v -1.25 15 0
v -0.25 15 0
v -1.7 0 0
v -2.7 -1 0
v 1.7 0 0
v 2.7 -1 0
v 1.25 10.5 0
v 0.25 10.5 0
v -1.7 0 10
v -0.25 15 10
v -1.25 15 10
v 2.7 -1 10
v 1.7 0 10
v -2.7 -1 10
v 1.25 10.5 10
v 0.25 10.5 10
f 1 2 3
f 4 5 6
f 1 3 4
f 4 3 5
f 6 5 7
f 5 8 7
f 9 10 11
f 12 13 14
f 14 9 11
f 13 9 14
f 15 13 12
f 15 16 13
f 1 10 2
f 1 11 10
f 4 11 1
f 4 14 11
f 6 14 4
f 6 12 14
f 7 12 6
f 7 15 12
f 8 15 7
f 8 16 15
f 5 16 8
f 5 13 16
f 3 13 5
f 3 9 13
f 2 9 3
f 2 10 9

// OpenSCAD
// [FL_INDEX: keywords="openscad, 3d_parametric, Customizable_Tumbler_Tag, csg_solid" | COT="Parametric OpenSCAD design from 3DCodeverse"]
// Title: Customizable Tumbler Tag

/* Tumbler Tag by xifle */

// preview[view:north, tilt:top]
/* [Parameters] */

// The maximum glass thickness this tag will work with in mm
GLASS_MAX = 2.5;

// The minimum glass thickness this tag will work with in mm
GLASS_MIN = 0.5;

// The height of the tag in mm
HEIGHT = 15; //[5:30]

// The width of the tag in mm
WIDTH = 10; //[5:30]

// Wall thickness in mm
WALL = 1;

/* [Hidden] */

RADIUS = (WALL-0.1)/2;

linear_extrude(height=WIDTH) {
union() {
	halfed_outline(GLASS_MAX, GLASS_MIN, HEIGHT*0.7, RADIUS, WALL);
	mirror([1,0,0]) {
		halfed_outline(GLASS_MAX, GLASS_MIN, HEIGHT, RADIUS, WALL);
	}
}
}

module halfed_outline(max, min, height, radius, wall) {

	polygon(points=[[0,0],[max/2+radius,0],[min/2,height],[min/2+wall,height], [max/2+radius+wall,-wall], [0,-wall]], paths=[[0,1,2,3,4,5]]);

}
